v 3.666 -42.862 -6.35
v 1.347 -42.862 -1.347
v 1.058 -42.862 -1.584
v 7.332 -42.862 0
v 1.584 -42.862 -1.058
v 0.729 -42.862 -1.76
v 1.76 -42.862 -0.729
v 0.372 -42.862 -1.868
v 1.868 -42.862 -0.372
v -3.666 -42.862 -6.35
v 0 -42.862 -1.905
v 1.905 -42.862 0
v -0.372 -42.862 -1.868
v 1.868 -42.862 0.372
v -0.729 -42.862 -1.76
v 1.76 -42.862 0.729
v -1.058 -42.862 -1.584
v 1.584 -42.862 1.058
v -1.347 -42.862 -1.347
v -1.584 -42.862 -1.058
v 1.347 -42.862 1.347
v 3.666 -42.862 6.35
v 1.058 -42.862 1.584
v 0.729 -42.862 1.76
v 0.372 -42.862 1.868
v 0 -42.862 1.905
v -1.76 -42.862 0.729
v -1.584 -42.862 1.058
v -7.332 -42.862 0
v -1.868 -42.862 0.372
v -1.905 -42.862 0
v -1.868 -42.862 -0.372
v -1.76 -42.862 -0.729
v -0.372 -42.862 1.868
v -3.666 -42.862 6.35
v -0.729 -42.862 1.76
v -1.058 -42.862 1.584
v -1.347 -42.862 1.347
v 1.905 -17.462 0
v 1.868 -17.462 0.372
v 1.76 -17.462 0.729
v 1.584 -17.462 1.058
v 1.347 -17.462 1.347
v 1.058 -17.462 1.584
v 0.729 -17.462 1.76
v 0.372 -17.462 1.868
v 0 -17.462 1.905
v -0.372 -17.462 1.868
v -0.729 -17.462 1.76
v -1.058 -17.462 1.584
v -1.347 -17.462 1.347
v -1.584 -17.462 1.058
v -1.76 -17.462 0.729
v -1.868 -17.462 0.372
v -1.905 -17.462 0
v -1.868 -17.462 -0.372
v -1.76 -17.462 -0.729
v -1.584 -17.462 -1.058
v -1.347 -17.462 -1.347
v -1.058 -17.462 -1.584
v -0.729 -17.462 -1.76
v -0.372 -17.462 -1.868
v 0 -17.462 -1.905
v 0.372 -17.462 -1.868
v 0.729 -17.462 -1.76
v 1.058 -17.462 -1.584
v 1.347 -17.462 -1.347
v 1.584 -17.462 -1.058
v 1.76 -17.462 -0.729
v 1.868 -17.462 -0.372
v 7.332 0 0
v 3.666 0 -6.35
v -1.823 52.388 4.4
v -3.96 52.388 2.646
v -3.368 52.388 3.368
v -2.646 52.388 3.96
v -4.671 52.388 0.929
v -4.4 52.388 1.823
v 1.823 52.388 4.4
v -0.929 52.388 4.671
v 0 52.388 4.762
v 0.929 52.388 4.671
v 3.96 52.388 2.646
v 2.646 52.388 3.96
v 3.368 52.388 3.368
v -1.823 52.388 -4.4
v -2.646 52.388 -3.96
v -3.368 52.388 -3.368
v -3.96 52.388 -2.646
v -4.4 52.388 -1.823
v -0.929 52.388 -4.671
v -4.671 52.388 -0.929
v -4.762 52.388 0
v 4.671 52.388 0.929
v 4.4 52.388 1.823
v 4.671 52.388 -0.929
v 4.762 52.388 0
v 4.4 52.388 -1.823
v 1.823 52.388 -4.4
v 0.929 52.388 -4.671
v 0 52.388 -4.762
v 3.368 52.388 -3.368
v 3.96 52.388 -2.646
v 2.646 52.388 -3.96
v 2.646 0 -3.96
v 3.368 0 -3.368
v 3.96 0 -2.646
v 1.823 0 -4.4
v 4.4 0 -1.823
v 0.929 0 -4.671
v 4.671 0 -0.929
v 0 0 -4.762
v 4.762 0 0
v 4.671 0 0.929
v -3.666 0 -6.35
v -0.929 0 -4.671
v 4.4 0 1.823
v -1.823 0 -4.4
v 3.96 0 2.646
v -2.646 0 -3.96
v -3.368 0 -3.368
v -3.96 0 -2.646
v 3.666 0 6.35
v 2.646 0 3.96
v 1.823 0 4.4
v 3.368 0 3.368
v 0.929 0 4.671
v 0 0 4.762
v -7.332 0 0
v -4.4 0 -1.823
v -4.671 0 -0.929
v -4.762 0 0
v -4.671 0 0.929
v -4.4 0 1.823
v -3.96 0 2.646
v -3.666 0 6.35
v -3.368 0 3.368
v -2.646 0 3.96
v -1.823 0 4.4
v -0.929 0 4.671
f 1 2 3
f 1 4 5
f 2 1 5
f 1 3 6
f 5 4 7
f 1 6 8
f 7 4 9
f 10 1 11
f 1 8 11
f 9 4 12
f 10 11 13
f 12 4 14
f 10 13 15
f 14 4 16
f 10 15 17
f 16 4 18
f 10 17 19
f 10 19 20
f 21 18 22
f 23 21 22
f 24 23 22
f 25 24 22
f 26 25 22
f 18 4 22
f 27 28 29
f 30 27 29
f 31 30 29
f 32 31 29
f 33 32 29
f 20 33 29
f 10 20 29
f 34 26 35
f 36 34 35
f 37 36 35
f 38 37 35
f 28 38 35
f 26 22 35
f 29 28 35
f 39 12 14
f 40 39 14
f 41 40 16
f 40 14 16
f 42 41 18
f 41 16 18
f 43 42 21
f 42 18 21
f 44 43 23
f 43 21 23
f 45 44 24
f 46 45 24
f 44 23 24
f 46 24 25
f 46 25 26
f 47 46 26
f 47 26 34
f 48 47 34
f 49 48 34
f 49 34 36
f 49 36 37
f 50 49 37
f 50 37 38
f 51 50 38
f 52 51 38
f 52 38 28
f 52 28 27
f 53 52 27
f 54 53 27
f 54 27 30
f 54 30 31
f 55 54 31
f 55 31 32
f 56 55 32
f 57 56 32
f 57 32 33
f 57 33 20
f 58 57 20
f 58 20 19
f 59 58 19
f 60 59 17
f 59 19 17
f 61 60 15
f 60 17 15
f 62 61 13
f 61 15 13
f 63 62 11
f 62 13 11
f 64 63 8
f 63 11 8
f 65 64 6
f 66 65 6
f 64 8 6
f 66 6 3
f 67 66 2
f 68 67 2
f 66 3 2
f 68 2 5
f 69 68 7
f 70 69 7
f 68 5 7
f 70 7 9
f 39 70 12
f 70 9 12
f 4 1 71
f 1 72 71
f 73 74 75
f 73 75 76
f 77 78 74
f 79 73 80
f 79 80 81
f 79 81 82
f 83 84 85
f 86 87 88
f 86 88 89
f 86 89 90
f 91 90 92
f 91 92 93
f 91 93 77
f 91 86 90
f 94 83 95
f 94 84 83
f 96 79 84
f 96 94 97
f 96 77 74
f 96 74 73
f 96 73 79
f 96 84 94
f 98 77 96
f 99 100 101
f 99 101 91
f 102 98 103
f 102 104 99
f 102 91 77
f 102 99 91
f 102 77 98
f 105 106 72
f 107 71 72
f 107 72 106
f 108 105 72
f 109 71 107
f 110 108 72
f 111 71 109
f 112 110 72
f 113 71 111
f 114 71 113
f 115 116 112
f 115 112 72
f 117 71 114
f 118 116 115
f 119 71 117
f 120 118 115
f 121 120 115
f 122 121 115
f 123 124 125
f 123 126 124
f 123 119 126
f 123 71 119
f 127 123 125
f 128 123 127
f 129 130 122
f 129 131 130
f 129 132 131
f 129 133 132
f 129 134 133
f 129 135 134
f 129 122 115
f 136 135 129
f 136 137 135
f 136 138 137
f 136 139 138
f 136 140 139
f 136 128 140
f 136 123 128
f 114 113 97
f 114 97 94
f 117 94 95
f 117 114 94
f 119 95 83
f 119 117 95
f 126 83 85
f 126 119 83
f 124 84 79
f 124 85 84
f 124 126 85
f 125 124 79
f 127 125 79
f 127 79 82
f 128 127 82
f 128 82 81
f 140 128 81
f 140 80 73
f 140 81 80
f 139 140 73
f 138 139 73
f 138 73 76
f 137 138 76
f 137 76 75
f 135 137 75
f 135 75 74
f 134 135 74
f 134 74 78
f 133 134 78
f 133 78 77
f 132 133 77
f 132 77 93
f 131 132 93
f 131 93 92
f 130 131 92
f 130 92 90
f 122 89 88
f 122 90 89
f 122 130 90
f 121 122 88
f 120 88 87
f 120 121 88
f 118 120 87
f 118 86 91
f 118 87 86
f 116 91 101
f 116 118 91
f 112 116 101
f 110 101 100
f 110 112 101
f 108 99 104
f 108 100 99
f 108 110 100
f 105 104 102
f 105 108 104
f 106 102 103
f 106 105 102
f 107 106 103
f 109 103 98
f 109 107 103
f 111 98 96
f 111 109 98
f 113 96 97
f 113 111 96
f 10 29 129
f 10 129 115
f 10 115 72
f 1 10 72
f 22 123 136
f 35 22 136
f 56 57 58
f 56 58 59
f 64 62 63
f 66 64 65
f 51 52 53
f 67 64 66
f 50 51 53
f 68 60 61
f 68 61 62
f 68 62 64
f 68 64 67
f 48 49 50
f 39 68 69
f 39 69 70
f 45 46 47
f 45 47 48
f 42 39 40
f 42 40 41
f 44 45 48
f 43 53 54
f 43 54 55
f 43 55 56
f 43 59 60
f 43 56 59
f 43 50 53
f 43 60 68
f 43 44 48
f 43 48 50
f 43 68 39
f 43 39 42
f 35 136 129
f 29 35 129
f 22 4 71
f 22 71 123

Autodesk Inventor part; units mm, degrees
ref_plane "YZ Plane" through (0, 0, 0) normal (1, 0, 0) x (0, 1, 0)
ref_plane "XZ Plane" through (0, 0, 0) normal (0, 1, 0) x (-1, 0, 0)
ref_plane "XY Plane" through (0, 0, 0) normal (0, 0, 1) x (1, 0, 0)
sketch "Sketch1" plane through (0, 0, 0) normal (0, 1, 0) x (-1, 0, 0)
  line L0 (3.6662, -6.35) -> (-3.6662, -6.35)
  line L1 (-3.6662, -6.35) -> (-7.3323, 0)
  line L2 (-7.3323, 0) -> (-3.6662, 6.35)
  line L3 (-3.6662, 6.35) -> (3.6662, 6.35)
  line L4 (3.6662, 6.35) -> (7.3323, 0)
  line L5 (7.3323, 0) -> (3.6662, -6.35)
  point P0 (0, 0)
  point P1 (0, 0)
  dimension "d0" = 12.7
extrude "Extrusion1" add sketch "Sketch1" against normal blind 42.8625
sketch "Sketch2" plane through (0, 0, 0) normal (0, 1, 0) x (1, 0, 0)
  circle A0 centre (0, 0) radius 4.7625
  dimension "d3" = 9.525
extrude "Extrusion2" add sketch "Sketch2" along normal blind 52.3875
sketch "Sketch3" plane through (0, -42.8625, 0) normal (0, -1, 0) x (1, 0, 0)
  circle A0 centre (0, 0) radius 4.7625 projected
  circle A1 centre (0, 0) radius 1.905
  dimension "d7" = 3.81
extrude "Extrusion3" cut sketch "Sketch3" against normal blind 25.4 contours A1
properties part number "Roller drive shaft" material "Aluminum 6061"
